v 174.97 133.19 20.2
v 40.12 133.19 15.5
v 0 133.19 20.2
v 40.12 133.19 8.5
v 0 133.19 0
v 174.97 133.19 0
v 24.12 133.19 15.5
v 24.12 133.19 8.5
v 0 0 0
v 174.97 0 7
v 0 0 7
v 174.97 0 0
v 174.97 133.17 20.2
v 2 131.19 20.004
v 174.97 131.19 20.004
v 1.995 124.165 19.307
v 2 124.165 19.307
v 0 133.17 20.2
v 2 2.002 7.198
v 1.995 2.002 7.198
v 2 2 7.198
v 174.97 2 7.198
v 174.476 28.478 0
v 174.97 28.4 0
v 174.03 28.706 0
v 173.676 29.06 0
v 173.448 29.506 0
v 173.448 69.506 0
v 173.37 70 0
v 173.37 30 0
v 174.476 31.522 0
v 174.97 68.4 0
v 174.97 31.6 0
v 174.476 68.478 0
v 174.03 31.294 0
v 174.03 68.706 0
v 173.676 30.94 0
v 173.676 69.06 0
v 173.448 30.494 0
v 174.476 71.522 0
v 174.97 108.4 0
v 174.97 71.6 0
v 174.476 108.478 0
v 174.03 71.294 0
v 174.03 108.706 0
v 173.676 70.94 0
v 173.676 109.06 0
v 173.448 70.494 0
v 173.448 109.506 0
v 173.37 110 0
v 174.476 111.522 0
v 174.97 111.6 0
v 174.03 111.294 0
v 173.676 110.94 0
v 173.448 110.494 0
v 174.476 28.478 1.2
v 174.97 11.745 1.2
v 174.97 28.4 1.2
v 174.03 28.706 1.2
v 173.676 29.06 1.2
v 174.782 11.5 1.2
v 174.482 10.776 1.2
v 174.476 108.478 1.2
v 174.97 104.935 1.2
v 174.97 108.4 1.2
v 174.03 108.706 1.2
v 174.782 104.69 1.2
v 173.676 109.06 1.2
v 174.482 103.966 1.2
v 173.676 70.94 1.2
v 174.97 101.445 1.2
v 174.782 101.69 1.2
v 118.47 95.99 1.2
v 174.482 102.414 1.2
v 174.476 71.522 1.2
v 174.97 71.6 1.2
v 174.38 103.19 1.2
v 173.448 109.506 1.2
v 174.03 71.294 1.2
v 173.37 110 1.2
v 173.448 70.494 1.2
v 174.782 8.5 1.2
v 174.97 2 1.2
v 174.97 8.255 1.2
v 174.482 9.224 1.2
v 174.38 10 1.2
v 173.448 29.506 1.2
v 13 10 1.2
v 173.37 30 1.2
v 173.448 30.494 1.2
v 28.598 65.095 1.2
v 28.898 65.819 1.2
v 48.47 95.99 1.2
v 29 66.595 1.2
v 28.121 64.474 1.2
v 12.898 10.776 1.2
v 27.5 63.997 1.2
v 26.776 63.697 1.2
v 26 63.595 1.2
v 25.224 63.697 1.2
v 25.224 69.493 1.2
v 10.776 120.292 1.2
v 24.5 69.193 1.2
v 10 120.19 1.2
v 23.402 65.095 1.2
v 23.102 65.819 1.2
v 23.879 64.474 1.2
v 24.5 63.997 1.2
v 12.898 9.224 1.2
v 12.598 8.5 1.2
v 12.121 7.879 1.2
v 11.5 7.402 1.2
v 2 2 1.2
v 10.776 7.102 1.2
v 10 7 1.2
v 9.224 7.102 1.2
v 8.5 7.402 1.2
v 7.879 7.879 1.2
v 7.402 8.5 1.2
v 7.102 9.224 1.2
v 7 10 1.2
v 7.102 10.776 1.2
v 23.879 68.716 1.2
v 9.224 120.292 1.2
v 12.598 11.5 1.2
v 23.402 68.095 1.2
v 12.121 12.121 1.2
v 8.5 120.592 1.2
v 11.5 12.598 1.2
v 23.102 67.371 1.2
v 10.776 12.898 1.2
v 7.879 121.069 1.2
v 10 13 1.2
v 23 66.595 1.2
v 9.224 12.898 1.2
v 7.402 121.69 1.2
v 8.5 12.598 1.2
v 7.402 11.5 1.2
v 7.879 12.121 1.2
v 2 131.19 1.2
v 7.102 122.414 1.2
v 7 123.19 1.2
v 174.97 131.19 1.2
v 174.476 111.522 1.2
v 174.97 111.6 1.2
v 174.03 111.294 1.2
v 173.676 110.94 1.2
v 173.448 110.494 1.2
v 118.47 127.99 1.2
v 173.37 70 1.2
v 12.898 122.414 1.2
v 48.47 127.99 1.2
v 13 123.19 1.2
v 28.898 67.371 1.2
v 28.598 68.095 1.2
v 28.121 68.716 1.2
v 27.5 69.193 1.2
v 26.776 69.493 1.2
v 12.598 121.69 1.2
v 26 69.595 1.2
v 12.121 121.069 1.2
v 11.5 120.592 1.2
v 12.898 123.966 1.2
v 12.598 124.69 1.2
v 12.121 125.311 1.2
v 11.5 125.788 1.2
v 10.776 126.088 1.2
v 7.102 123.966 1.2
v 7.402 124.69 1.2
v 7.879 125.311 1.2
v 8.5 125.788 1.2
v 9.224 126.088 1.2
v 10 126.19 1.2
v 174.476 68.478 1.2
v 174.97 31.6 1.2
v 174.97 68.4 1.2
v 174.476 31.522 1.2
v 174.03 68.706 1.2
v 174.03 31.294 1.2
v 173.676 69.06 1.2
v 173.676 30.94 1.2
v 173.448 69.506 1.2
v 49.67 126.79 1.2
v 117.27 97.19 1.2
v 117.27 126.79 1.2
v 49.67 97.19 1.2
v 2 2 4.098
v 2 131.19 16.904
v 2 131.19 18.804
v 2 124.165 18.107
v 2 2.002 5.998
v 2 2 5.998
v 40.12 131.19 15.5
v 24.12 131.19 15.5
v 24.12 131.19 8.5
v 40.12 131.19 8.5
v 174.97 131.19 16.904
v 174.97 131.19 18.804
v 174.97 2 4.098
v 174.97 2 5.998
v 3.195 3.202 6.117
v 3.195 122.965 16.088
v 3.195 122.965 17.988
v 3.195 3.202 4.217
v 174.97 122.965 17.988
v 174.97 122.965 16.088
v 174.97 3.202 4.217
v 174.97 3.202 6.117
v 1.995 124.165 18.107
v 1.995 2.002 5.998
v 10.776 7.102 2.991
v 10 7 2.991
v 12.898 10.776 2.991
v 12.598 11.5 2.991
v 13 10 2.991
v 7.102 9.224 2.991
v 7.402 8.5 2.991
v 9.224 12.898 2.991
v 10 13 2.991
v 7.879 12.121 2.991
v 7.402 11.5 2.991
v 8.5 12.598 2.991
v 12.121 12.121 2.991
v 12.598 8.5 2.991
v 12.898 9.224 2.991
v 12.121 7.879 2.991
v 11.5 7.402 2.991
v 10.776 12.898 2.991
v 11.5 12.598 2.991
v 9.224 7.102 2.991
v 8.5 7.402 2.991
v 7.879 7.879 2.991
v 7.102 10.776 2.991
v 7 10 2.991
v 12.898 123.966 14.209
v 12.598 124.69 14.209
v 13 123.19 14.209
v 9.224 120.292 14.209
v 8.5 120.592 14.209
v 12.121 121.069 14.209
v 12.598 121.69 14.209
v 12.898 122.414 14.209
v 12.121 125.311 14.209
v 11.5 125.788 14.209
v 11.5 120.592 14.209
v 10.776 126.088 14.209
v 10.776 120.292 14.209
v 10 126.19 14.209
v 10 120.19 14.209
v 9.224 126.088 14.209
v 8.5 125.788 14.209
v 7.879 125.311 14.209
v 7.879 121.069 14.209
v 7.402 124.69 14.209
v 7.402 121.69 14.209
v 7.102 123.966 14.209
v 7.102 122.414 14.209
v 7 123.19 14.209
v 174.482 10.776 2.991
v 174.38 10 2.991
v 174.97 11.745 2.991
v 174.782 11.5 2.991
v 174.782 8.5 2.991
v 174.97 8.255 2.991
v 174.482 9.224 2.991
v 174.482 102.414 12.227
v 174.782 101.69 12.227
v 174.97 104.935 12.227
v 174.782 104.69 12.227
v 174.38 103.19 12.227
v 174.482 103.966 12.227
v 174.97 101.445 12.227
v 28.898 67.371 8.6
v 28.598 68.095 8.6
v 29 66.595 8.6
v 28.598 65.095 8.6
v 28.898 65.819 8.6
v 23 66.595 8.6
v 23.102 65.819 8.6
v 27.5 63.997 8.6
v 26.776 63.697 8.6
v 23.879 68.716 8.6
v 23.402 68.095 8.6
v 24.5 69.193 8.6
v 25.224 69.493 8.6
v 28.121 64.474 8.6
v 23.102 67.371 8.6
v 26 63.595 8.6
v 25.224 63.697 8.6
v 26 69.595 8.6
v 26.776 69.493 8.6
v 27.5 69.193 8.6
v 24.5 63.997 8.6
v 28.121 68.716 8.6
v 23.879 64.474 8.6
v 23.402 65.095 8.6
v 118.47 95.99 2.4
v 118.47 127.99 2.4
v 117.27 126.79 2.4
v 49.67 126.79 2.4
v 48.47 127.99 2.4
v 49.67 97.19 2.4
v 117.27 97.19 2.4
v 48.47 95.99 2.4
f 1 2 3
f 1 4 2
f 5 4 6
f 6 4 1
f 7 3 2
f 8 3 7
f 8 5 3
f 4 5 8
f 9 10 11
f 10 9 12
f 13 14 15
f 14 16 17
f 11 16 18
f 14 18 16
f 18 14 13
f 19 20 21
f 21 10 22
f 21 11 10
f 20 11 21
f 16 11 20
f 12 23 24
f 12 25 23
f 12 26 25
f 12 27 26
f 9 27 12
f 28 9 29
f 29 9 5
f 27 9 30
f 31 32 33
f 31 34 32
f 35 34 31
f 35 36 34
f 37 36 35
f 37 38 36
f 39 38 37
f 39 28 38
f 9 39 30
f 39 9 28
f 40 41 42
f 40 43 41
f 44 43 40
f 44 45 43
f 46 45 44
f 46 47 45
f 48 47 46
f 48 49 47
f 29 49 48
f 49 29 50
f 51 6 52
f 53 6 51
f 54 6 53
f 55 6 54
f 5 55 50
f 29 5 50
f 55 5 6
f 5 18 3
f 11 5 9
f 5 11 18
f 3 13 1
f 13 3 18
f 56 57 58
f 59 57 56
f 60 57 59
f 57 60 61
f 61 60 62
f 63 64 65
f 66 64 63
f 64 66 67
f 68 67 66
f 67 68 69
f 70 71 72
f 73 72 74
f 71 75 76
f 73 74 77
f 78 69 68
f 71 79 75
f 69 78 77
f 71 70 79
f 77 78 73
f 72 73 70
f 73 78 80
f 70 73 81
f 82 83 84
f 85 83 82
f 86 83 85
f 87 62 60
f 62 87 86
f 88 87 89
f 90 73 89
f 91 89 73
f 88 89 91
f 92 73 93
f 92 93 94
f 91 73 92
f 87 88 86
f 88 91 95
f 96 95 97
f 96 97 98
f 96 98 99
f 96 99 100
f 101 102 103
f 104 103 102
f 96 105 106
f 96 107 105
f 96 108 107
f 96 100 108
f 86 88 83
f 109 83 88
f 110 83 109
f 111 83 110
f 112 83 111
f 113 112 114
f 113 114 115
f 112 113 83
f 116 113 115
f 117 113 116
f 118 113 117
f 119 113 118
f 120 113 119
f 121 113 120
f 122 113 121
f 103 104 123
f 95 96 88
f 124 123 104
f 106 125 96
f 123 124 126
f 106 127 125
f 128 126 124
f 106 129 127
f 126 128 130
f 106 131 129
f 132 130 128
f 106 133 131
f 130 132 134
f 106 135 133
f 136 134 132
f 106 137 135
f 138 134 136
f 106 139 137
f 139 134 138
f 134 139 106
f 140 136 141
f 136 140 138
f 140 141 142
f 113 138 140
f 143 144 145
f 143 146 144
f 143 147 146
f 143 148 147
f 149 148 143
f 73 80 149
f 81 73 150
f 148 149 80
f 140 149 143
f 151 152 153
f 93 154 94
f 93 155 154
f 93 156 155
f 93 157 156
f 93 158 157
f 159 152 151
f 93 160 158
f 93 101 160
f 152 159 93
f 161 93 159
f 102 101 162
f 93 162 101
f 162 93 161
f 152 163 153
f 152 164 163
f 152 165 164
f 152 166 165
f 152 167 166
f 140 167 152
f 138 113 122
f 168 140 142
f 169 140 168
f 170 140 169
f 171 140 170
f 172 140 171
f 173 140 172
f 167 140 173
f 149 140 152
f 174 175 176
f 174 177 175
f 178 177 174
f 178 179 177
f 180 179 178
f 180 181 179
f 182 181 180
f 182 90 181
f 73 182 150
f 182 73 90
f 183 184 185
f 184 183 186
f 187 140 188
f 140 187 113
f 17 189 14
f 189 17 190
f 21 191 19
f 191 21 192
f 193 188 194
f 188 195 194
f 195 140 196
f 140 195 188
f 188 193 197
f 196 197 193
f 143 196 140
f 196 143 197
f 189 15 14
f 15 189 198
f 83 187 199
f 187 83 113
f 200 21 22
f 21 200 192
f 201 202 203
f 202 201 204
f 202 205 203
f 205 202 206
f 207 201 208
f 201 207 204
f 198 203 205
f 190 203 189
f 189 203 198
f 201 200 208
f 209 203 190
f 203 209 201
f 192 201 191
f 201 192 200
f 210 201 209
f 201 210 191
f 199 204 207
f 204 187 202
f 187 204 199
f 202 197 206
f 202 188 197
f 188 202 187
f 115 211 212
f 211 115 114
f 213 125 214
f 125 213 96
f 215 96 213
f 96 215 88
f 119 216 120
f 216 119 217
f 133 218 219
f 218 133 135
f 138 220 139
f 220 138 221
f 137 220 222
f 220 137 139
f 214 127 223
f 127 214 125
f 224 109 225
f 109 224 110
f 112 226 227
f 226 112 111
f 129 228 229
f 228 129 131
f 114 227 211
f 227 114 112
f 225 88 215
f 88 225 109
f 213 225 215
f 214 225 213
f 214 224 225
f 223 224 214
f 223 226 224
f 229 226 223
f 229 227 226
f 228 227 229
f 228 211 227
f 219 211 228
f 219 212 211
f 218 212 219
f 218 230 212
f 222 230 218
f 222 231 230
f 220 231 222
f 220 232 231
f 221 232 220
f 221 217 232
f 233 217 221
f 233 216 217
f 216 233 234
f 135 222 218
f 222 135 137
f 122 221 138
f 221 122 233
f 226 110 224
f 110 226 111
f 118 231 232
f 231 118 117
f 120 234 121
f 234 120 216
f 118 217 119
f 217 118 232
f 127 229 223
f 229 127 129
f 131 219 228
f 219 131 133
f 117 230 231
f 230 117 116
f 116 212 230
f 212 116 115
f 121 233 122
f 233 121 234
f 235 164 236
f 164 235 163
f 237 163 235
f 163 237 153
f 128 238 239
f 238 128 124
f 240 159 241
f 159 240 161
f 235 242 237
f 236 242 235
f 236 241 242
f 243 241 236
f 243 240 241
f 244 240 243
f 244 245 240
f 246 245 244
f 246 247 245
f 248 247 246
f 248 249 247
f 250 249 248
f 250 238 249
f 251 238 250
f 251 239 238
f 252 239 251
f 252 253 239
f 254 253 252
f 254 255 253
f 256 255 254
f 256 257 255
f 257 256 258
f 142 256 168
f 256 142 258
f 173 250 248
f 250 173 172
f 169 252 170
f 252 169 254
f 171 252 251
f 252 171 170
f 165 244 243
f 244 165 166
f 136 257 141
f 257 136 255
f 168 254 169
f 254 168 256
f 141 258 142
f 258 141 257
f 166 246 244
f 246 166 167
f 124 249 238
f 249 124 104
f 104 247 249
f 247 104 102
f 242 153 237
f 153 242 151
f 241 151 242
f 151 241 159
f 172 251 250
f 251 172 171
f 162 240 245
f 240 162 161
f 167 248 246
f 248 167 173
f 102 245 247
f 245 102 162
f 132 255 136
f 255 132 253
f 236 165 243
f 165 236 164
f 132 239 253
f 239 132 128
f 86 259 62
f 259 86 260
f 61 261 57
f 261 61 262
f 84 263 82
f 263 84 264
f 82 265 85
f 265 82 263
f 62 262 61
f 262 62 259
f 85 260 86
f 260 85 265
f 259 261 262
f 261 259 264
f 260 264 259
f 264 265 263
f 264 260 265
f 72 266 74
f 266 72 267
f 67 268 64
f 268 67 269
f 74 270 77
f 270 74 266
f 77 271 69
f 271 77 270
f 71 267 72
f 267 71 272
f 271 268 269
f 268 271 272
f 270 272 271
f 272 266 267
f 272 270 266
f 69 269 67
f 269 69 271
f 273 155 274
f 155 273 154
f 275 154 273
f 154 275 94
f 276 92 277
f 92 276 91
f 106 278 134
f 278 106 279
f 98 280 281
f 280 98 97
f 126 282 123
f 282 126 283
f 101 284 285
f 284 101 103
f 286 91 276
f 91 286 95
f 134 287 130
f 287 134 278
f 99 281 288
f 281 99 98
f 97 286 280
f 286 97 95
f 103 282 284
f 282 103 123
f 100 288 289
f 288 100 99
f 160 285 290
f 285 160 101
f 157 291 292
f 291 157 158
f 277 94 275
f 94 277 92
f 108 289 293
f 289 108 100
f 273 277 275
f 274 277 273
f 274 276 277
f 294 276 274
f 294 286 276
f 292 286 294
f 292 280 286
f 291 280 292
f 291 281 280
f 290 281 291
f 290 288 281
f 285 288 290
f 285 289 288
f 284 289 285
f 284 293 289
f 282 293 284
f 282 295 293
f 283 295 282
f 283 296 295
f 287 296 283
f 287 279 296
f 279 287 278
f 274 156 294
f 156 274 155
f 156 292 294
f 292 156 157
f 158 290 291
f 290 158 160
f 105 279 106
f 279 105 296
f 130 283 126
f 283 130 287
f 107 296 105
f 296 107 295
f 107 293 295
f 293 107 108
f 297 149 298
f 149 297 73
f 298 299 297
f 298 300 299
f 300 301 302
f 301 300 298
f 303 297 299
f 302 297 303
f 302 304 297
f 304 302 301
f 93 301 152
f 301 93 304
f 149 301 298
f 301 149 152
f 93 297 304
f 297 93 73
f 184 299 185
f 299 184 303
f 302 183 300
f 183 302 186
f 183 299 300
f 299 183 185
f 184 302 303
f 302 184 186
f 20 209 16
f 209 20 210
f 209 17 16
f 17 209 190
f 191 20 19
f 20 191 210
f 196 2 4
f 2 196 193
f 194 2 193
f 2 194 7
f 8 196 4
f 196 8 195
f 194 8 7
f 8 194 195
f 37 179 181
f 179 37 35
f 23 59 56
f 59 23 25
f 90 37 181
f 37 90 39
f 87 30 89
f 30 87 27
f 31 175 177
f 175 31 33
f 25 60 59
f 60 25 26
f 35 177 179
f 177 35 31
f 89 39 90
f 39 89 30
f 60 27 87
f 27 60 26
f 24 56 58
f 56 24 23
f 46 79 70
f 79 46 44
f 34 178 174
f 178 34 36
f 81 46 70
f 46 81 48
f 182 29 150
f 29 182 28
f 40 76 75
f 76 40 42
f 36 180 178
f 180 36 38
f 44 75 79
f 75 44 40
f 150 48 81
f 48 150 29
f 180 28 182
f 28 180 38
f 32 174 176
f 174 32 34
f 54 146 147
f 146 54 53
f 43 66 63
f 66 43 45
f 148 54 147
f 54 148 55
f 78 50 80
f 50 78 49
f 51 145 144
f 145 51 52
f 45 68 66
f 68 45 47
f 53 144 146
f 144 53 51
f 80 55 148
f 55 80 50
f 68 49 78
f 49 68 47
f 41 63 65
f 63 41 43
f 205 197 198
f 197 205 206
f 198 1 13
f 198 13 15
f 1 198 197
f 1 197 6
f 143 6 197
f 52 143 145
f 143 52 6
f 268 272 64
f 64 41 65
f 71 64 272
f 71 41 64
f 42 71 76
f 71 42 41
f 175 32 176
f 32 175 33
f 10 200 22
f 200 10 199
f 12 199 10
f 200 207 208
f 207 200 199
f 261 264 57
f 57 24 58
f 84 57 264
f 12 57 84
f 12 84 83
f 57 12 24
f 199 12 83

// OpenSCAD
// Wedge shell. Flat on the table.
// Front lip 7.0 mm, rear lip 20.2 mm.
// Print each half with the flat bottom on the bed, 0.2 mm layers, 4 walls.
Hf = 7.0;
Hr = 20.2;
floor_t = 1.2;
wall = 2.0;
plate_t = 1.2;
ledge = 1.2;
W = 354.7600;
D = 133.1900;
part = is_undef(part) ? "left" : part;
split_x = 174.9700; // straight joint; the plate seam steps across it
plate_x = 1.9950;
plate_y = 2.0025;
plate_w = 350.7625;
plate_d = 122.1625;
pcb_x = 2.0000;
pcb_y = 2.0000;
pcb_w = 350.7600;
pcb_d = 129.1900;

function rim(y) = Hf + (Hr - Hf) * y / D;
// Bottom of the 1.6 mm PCB: 1.2 plate + 2.2 switch gap + 1.6 board below the rim.
function pcb_bottom(y) = rim(y) - 5.0;

module outer() {
  hull() {
    cube([W, 0.02, Hf]);
    translate([0, D - 0.02, 0]) cube([W, 0.02, Hr]);
  }
}

module below_z(drop) {
  hull() {
    cube([W, 0.02, Hf - drop]);
    translate([0, D - 0.02, 0]) cube([W, 0.02, Hr - drop]);
  }
}

// Band between the top of the PCB and the underside of the plate.
module shelf_band() {
  difference() {
    below_z(plate_t);
    below_z(3.1);
  }
}

// Plastic over the PCB margin. The inner edge tucks under the plate so the plate has a seat.
module shelf() {
  intersection() {
    difference() {
      translate([pcb_x - 0.2, pcb_y - 0.2, 0]) cube([pcb_w + 0.4, pcb_d + 0.4, 40]);
      translate([plate_x + ledge, plate_y + ledge, -1])
        cube([plate_w - 2 * ledge, plate_d - 2 * ledge, 50]);
    }
    shelf_band();
  }
}

module plate_opening() {
  difference() {
    translate([plate_x, plate_y, 0]) cube([plate_w, plate_d, 40]);
    below_z(plate_t);
  }
}

module boss(x, y) {
  h = pcb_bottom(y) - floor_t;
  if (h > 0.4)
    translate([x, y, floor_t - 0.2]) cylinder(h=h + 0.2, d=6, $fn=24);
}

module bosses() {
    boss(10.000, 10.000);
    boss(344.760, 10.000);
    boss(10.000, 123.190);
    boss(344.760, 123.190);
    boss(177.380, 10.000);
    boss(177.380, 103.190);
    boss(26.000, 66.595);
    boss(328.760, 66.595);
}

// Keeps a thin pouch cell from sliding into the module. Sits well below the PCB.
module battery_dam() {
  translate([48.47, 95.99, floor_t - 0.2])
    difference() {
      cube([70, 32, 1.4]);
      translate([1.2, 1.2, -0.2]) cube([67.6, 29.6, 2]);
    }
}

module usb_slot() {
  translate([24.120, D - wall - 1, 8.5])
    cube([16, wall + 2, 7]);
}

module shell() {
  difference() {
    union() {
      difference() {
        outer();
        translate([pcb_x, pcb_y, floor_t]) cube([pcb_w, pcb_d, 40]);
      }
      shelf();
      bosses();
      battery_dam();
    }
    usb_slot();
    plate_opening();
  }
}

module pinned() {
  difference() {
    shell();
    for (y = [30, 70, 110])
      translate([split_x, y, -1]) cylinder(h=floor_t + 2, d=3.2, $fn=20);
  }
}

if (part == "left")
  intersection() {
    pinned();
    translate([-1, -1, -1]) cube([split_x + 1, D + 2, 40]);
  }
if (part == "right")
  intersection() {
    pinned();
    translate([split_x, -1, -1]) cube([W, D + 2, 40]);
  }
